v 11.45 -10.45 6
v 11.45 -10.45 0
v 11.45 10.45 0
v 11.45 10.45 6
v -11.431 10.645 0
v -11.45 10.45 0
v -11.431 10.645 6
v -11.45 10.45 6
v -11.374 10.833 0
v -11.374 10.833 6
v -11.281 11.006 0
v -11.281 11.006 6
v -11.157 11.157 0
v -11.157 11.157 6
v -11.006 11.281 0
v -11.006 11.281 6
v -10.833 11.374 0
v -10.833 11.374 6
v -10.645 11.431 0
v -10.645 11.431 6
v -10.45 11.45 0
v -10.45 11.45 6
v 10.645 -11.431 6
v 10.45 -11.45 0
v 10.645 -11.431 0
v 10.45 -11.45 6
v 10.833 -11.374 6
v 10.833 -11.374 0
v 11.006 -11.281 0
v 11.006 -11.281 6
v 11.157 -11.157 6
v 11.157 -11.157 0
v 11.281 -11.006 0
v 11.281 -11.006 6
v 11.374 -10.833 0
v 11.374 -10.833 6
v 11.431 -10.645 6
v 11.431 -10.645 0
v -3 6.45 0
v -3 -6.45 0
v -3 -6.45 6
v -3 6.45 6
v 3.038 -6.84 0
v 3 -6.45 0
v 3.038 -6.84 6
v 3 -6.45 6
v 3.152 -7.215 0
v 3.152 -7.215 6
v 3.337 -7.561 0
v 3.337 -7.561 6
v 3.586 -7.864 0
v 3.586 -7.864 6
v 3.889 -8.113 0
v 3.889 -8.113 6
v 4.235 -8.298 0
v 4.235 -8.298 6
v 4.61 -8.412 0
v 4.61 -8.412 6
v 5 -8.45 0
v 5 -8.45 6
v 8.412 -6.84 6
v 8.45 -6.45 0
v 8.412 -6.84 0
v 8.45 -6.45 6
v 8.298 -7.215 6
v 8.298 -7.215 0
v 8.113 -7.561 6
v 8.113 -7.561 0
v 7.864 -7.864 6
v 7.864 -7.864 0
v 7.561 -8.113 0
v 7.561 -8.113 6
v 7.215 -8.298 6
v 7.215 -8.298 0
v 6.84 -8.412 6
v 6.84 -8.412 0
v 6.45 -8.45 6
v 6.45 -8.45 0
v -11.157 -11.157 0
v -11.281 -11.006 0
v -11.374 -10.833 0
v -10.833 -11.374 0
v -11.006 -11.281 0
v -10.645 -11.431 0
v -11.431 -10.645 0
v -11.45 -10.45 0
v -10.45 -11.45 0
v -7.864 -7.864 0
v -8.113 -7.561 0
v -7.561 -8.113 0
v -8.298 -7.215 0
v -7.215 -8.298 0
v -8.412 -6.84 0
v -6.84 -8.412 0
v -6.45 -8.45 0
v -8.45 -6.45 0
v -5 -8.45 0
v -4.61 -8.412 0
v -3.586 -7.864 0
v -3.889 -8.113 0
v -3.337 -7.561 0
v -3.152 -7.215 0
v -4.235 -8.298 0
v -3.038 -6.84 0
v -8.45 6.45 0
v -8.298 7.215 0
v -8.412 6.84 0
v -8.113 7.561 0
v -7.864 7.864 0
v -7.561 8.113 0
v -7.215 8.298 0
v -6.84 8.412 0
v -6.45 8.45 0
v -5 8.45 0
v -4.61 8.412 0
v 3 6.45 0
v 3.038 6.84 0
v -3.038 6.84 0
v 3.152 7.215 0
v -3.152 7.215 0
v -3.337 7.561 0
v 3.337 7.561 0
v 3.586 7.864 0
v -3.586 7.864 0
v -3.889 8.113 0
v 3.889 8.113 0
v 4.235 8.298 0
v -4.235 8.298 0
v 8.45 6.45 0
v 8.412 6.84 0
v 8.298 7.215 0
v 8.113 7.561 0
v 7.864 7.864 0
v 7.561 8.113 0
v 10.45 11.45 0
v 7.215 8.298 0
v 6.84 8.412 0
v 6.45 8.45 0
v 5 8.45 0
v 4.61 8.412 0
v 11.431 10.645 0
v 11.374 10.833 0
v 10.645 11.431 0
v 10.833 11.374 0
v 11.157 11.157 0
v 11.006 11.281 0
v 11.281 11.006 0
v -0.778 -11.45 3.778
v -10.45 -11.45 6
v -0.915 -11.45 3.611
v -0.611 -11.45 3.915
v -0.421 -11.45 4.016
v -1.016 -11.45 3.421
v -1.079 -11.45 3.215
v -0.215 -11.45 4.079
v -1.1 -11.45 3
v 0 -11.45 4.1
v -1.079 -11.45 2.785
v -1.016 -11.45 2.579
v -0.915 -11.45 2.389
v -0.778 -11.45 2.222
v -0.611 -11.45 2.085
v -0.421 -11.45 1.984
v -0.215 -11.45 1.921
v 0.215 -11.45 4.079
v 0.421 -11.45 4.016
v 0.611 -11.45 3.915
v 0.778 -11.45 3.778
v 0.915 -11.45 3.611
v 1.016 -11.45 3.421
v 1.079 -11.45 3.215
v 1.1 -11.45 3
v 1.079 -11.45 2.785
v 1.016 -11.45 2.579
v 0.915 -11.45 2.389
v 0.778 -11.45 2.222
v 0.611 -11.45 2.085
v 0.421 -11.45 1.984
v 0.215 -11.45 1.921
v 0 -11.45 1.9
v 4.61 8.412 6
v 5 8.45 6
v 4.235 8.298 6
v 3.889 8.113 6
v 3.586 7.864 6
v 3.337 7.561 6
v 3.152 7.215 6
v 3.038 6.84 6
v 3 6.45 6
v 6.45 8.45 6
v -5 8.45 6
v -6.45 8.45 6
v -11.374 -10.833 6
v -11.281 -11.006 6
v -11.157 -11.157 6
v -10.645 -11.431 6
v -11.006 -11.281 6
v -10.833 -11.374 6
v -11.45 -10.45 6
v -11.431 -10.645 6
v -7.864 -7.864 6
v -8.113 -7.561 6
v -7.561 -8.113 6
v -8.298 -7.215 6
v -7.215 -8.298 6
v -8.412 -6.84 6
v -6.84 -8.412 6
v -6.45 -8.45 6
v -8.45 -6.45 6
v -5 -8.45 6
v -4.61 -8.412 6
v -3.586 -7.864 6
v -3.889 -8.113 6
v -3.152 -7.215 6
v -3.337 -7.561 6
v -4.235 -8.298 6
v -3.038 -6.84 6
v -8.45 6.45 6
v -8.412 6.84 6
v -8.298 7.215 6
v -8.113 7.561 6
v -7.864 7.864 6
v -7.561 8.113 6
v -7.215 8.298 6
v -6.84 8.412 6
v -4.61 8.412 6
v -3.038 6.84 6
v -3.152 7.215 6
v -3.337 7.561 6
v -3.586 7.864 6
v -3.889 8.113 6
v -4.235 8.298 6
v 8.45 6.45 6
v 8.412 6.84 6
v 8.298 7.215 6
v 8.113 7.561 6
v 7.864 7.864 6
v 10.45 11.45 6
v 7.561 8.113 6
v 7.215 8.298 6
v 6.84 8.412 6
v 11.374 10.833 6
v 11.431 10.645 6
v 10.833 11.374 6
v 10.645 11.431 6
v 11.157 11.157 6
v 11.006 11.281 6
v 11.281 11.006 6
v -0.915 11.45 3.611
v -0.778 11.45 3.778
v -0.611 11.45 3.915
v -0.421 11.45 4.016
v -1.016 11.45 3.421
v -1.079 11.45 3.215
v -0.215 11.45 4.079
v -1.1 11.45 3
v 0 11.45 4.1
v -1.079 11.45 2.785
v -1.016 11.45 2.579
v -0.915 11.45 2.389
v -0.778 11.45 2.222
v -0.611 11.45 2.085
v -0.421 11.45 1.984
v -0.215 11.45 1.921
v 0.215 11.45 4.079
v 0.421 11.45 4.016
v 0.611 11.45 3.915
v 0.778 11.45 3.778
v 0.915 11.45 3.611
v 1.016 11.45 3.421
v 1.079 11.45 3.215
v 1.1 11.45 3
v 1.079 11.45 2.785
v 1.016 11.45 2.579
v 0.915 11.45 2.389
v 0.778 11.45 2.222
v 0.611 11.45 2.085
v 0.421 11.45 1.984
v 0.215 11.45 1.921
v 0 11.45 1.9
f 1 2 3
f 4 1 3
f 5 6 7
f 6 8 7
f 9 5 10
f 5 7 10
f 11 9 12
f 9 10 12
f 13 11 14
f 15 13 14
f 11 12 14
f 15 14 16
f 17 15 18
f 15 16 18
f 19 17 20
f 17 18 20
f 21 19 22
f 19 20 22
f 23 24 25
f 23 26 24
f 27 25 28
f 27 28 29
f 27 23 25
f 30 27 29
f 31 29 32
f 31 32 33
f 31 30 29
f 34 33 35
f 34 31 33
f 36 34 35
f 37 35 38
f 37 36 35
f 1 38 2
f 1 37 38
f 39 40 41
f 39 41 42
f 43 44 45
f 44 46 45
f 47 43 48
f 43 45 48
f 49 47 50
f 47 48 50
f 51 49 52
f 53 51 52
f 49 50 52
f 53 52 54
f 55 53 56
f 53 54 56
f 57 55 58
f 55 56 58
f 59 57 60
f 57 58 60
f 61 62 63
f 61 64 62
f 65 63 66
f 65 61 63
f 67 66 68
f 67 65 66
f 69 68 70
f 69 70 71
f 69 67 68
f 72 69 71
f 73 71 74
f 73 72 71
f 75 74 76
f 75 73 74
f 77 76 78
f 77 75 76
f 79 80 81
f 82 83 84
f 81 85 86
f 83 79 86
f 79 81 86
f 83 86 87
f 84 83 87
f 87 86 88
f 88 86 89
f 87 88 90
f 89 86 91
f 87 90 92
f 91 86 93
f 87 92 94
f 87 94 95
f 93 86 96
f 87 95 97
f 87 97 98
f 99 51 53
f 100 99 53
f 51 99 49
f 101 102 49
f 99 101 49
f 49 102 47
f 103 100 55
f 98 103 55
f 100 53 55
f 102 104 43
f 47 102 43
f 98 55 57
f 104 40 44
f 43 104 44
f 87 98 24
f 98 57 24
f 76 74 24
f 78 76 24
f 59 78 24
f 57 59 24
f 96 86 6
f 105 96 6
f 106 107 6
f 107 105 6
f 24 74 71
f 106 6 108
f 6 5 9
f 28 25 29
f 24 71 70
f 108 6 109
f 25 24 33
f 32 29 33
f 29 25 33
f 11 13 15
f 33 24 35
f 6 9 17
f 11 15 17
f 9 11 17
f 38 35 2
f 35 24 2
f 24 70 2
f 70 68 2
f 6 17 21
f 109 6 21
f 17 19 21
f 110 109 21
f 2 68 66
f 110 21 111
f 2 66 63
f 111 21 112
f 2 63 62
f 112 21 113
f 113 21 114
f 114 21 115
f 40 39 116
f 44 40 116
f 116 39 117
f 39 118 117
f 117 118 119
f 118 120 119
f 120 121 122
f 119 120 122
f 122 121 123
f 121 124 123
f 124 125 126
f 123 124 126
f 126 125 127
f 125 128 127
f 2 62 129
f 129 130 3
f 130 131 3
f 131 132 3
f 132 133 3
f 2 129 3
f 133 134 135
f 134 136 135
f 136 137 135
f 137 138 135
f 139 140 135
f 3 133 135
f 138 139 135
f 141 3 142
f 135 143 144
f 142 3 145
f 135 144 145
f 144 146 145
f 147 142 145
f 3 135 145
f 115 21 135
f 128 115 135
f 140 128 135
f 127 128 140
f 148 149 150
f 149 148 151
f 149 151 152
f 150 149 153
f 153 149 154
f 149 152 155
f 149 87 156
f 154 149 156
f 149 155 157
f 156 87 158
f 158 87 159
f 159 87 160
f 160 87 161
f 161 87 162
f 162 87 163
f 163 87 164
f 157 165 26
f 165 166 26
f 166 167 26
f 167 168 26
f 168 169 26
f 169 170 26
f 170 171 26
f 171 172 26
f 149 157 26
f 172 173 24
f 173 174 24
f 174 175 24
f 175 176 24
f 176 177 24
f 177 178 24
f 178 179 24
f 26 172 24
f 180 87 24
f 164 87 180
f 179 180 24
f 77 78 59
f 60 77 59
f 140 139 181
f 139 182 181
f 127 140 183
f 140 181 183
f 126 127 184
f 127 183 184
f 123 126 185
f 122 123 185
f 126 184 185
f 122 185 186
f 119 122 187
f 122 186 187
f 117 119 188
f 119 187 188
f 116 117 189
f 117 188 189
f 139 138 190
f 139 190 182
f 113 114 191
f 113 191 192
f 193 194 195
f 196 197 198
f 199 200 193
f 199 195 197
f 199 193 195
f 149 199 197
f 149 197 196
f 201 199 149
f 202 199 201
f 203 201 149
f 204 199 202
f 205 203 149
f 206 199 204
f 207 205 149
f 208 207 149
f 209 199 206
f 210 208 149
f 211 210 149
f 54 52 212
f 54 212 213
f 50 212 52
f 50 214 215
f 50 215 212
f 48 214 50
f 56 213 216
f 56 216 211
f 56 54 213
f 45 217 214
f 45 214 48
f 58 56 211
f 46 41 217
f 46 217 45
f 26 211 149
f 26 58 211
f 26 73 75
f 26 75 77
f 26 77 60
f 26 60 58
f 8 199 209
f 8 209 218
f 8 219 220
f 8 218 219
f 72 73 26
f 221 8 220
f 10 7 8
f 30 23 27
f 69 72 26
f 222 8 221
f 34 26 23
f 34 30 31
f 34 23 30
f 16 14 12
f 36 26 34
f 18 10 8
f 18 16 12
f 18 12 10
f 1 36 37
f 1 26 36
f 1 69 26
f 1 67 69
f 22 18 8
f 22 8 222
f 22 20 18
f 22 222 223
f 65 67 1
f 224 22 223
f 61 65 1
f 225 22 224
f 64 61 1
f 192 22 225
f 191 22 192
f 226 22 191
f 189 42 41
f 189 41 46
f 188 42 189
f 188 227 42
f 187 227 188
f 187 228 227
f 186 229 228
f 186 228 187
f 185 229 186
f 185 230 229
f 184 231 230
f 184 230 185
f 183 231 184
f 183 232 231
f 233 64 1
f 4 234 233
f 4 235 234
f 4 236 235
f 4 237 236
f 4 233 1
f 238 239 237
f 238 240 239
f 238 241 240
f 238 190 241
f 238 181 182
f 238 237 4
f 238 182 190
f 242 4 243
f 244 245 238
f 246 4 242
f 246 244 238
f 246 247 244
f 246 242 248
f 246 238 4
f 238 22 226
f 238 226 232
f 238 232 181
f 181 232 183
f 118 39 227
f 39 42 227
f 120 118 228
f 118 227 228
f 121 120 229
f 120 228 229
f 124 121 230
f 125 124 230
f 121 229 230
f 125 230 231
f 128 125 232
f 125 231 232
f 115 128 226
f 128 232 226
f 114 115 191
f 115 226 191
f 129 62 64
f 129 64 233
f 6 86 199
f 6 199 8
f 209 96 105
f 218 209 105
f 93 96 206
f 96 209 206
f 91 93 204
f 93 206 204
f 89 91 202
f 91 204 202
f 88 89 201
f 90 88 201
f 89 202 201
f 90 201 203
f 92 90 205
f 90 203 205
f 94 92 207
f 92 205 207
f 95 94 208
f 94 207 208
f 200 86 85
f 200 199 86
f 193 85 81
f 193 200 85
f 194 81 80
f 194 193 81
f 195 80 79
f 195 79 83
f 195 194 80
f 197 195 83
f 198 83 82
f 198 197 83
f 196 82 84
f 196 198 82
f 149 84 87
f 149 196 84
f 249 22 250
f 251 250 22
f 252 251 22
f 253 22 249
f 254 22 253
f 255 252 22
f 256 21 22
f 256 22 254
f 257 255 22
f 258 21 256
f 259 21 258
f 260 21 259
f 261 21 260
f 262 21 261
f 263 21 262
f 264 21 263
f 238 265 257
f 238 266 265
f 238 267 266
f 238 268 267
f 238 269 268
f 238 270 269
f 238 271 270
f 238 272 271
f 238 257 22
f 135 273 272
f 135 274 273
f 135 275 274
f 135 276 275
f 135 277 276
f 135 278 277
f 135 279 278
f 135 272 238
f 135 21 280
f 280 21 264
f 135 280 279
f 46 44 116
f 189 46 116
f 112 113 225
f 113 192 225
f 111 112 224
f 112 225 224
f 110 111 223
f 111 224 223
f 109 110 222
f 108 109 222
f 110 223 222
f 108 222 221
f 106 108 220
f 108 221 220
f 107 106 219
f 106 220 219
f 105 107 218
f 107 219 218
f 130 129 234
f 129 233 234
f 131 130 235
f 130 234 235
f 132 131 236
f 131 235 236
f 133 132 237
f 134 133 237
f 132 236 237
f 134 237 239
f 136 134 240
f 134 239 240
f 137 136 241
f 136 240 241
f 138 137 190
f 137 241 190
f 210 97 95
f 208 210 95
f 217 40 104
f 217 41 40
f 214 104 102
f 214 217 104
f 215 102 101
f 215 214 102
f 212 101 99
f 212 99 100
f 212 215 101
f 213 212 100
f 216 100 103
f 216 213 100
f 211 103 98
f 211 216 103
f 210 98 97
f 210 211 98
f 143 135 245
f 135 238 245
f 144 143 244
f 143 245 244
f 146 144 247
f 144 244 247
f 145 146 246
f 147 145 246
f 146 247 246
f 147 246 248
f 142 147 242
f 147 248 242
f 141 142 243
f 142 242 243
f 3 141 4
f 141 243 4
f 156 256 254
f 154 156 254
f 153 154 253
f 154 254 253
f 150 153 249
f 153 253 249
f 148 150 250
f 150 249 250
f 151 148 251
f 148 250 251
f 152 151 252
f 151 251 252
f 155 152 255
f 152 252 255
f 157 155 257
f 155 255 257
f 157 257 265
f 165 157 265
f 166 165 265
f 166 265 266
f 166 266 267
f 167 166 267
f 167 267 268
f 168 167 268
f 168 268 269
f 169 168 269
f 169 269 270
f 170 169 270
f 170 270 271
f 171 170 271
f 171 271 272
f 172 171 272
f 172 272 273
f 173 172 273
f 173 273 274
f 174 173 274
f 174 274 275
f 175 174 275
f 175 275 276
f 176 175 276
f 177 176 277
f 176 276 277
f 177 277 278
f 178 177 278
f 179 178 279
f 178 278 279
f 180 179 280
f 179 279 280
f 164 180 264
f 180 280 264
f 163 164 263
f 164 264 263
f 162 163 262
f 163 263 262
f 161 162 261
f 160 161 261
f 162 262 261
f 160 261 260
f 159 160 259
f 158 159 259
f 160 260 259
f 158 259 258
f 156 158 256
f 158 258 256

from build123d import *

# Parameters (mm, degrees)
SKETCH_1_W          = 22.9
SKETCH_1_H          = 22.9
EXTRUDE_1_DEPTH     = 6
SKETCH_2_R          = 1.1
CUT_EXTRUDE_1_DEPTH = 27.296625259
SKETCH_3_W          = 5.45
SKETCH_3_H          = 16.9
CUT_EXTRUDE_2_DEPTH = 6
FILLET_1_R          = 2
FILLET_2_R          = 1


with BuildPart() as part:
    # 草图1 → 凸台-拉伸1 (new body)
    with BuildSketch(Plane.XY):
        Rectangle(SKETCH_1_W, SKETCH_1_H)
    extrude(amount=EXTRUDE_1_DEPTH)

    # 草图2 → 切除-拉伸1 (cut, through all)
    with BuildSketch(Plane(origin=(0, 11.45, 0), x_dir=(1, 0, 0), z_dir=(0, 1, 0))):
        with Locations(Location((0, -3, 0), (0, 0, 180))):
            Circle(SKETCH_2_R)
    extrude(amount=-CUT_EXTRUDE_1_DEPTH, mode=Mode.SUBTRACT)

    # 草图3 → 切除-拉伸2 (cut)
    with BuildSketch(Plane(origin=(0, 0, 0), x_dir=(-1, 0, 0), z_dir=(0, 0, -1))):
        with Locations((5.725, 0)):
            Rectangle(SKETCH_3_W, SKETCH_3_H)
        with Locations((-5.725, 0)):
            Rectangle(SKETCH_3_W, SKETCH_3_H)
    extrude(amount=-CUT_EXTRUDE_2_DEPTH, mode=Mode.SUBTRACT)

    # 圆角1
    fillet_1_edges = [part.edges().sort_by_distance(p)[0] for p in [
        (-8.45, 8.45, 3),
        (-8.45, -8.45, 3),
        (-3, -8.45, 3),
        (-3, 8.45, 3),
        (3, 8.45, 3),
        (3, -8.45, 3),
        (8.45, -8.45, 3),
        (8.45, 8.45, 3),
    ]]
    fillet(fillet_1_edges, radius=FILLET_1_R)

    # 圆角2
    fillet_2_edges = [part.edges().sort_by_distance(p)[0] for p in [
        (-11.45, 11.45, 3),
        (11.45, 11.45, 3),
        (11.45, -11.45, 3),
        (-11.45, -11.45, 3),
    ]]
    fillet(fillet_2_edges, radius=FILLET_2_R)


solid = part.part
